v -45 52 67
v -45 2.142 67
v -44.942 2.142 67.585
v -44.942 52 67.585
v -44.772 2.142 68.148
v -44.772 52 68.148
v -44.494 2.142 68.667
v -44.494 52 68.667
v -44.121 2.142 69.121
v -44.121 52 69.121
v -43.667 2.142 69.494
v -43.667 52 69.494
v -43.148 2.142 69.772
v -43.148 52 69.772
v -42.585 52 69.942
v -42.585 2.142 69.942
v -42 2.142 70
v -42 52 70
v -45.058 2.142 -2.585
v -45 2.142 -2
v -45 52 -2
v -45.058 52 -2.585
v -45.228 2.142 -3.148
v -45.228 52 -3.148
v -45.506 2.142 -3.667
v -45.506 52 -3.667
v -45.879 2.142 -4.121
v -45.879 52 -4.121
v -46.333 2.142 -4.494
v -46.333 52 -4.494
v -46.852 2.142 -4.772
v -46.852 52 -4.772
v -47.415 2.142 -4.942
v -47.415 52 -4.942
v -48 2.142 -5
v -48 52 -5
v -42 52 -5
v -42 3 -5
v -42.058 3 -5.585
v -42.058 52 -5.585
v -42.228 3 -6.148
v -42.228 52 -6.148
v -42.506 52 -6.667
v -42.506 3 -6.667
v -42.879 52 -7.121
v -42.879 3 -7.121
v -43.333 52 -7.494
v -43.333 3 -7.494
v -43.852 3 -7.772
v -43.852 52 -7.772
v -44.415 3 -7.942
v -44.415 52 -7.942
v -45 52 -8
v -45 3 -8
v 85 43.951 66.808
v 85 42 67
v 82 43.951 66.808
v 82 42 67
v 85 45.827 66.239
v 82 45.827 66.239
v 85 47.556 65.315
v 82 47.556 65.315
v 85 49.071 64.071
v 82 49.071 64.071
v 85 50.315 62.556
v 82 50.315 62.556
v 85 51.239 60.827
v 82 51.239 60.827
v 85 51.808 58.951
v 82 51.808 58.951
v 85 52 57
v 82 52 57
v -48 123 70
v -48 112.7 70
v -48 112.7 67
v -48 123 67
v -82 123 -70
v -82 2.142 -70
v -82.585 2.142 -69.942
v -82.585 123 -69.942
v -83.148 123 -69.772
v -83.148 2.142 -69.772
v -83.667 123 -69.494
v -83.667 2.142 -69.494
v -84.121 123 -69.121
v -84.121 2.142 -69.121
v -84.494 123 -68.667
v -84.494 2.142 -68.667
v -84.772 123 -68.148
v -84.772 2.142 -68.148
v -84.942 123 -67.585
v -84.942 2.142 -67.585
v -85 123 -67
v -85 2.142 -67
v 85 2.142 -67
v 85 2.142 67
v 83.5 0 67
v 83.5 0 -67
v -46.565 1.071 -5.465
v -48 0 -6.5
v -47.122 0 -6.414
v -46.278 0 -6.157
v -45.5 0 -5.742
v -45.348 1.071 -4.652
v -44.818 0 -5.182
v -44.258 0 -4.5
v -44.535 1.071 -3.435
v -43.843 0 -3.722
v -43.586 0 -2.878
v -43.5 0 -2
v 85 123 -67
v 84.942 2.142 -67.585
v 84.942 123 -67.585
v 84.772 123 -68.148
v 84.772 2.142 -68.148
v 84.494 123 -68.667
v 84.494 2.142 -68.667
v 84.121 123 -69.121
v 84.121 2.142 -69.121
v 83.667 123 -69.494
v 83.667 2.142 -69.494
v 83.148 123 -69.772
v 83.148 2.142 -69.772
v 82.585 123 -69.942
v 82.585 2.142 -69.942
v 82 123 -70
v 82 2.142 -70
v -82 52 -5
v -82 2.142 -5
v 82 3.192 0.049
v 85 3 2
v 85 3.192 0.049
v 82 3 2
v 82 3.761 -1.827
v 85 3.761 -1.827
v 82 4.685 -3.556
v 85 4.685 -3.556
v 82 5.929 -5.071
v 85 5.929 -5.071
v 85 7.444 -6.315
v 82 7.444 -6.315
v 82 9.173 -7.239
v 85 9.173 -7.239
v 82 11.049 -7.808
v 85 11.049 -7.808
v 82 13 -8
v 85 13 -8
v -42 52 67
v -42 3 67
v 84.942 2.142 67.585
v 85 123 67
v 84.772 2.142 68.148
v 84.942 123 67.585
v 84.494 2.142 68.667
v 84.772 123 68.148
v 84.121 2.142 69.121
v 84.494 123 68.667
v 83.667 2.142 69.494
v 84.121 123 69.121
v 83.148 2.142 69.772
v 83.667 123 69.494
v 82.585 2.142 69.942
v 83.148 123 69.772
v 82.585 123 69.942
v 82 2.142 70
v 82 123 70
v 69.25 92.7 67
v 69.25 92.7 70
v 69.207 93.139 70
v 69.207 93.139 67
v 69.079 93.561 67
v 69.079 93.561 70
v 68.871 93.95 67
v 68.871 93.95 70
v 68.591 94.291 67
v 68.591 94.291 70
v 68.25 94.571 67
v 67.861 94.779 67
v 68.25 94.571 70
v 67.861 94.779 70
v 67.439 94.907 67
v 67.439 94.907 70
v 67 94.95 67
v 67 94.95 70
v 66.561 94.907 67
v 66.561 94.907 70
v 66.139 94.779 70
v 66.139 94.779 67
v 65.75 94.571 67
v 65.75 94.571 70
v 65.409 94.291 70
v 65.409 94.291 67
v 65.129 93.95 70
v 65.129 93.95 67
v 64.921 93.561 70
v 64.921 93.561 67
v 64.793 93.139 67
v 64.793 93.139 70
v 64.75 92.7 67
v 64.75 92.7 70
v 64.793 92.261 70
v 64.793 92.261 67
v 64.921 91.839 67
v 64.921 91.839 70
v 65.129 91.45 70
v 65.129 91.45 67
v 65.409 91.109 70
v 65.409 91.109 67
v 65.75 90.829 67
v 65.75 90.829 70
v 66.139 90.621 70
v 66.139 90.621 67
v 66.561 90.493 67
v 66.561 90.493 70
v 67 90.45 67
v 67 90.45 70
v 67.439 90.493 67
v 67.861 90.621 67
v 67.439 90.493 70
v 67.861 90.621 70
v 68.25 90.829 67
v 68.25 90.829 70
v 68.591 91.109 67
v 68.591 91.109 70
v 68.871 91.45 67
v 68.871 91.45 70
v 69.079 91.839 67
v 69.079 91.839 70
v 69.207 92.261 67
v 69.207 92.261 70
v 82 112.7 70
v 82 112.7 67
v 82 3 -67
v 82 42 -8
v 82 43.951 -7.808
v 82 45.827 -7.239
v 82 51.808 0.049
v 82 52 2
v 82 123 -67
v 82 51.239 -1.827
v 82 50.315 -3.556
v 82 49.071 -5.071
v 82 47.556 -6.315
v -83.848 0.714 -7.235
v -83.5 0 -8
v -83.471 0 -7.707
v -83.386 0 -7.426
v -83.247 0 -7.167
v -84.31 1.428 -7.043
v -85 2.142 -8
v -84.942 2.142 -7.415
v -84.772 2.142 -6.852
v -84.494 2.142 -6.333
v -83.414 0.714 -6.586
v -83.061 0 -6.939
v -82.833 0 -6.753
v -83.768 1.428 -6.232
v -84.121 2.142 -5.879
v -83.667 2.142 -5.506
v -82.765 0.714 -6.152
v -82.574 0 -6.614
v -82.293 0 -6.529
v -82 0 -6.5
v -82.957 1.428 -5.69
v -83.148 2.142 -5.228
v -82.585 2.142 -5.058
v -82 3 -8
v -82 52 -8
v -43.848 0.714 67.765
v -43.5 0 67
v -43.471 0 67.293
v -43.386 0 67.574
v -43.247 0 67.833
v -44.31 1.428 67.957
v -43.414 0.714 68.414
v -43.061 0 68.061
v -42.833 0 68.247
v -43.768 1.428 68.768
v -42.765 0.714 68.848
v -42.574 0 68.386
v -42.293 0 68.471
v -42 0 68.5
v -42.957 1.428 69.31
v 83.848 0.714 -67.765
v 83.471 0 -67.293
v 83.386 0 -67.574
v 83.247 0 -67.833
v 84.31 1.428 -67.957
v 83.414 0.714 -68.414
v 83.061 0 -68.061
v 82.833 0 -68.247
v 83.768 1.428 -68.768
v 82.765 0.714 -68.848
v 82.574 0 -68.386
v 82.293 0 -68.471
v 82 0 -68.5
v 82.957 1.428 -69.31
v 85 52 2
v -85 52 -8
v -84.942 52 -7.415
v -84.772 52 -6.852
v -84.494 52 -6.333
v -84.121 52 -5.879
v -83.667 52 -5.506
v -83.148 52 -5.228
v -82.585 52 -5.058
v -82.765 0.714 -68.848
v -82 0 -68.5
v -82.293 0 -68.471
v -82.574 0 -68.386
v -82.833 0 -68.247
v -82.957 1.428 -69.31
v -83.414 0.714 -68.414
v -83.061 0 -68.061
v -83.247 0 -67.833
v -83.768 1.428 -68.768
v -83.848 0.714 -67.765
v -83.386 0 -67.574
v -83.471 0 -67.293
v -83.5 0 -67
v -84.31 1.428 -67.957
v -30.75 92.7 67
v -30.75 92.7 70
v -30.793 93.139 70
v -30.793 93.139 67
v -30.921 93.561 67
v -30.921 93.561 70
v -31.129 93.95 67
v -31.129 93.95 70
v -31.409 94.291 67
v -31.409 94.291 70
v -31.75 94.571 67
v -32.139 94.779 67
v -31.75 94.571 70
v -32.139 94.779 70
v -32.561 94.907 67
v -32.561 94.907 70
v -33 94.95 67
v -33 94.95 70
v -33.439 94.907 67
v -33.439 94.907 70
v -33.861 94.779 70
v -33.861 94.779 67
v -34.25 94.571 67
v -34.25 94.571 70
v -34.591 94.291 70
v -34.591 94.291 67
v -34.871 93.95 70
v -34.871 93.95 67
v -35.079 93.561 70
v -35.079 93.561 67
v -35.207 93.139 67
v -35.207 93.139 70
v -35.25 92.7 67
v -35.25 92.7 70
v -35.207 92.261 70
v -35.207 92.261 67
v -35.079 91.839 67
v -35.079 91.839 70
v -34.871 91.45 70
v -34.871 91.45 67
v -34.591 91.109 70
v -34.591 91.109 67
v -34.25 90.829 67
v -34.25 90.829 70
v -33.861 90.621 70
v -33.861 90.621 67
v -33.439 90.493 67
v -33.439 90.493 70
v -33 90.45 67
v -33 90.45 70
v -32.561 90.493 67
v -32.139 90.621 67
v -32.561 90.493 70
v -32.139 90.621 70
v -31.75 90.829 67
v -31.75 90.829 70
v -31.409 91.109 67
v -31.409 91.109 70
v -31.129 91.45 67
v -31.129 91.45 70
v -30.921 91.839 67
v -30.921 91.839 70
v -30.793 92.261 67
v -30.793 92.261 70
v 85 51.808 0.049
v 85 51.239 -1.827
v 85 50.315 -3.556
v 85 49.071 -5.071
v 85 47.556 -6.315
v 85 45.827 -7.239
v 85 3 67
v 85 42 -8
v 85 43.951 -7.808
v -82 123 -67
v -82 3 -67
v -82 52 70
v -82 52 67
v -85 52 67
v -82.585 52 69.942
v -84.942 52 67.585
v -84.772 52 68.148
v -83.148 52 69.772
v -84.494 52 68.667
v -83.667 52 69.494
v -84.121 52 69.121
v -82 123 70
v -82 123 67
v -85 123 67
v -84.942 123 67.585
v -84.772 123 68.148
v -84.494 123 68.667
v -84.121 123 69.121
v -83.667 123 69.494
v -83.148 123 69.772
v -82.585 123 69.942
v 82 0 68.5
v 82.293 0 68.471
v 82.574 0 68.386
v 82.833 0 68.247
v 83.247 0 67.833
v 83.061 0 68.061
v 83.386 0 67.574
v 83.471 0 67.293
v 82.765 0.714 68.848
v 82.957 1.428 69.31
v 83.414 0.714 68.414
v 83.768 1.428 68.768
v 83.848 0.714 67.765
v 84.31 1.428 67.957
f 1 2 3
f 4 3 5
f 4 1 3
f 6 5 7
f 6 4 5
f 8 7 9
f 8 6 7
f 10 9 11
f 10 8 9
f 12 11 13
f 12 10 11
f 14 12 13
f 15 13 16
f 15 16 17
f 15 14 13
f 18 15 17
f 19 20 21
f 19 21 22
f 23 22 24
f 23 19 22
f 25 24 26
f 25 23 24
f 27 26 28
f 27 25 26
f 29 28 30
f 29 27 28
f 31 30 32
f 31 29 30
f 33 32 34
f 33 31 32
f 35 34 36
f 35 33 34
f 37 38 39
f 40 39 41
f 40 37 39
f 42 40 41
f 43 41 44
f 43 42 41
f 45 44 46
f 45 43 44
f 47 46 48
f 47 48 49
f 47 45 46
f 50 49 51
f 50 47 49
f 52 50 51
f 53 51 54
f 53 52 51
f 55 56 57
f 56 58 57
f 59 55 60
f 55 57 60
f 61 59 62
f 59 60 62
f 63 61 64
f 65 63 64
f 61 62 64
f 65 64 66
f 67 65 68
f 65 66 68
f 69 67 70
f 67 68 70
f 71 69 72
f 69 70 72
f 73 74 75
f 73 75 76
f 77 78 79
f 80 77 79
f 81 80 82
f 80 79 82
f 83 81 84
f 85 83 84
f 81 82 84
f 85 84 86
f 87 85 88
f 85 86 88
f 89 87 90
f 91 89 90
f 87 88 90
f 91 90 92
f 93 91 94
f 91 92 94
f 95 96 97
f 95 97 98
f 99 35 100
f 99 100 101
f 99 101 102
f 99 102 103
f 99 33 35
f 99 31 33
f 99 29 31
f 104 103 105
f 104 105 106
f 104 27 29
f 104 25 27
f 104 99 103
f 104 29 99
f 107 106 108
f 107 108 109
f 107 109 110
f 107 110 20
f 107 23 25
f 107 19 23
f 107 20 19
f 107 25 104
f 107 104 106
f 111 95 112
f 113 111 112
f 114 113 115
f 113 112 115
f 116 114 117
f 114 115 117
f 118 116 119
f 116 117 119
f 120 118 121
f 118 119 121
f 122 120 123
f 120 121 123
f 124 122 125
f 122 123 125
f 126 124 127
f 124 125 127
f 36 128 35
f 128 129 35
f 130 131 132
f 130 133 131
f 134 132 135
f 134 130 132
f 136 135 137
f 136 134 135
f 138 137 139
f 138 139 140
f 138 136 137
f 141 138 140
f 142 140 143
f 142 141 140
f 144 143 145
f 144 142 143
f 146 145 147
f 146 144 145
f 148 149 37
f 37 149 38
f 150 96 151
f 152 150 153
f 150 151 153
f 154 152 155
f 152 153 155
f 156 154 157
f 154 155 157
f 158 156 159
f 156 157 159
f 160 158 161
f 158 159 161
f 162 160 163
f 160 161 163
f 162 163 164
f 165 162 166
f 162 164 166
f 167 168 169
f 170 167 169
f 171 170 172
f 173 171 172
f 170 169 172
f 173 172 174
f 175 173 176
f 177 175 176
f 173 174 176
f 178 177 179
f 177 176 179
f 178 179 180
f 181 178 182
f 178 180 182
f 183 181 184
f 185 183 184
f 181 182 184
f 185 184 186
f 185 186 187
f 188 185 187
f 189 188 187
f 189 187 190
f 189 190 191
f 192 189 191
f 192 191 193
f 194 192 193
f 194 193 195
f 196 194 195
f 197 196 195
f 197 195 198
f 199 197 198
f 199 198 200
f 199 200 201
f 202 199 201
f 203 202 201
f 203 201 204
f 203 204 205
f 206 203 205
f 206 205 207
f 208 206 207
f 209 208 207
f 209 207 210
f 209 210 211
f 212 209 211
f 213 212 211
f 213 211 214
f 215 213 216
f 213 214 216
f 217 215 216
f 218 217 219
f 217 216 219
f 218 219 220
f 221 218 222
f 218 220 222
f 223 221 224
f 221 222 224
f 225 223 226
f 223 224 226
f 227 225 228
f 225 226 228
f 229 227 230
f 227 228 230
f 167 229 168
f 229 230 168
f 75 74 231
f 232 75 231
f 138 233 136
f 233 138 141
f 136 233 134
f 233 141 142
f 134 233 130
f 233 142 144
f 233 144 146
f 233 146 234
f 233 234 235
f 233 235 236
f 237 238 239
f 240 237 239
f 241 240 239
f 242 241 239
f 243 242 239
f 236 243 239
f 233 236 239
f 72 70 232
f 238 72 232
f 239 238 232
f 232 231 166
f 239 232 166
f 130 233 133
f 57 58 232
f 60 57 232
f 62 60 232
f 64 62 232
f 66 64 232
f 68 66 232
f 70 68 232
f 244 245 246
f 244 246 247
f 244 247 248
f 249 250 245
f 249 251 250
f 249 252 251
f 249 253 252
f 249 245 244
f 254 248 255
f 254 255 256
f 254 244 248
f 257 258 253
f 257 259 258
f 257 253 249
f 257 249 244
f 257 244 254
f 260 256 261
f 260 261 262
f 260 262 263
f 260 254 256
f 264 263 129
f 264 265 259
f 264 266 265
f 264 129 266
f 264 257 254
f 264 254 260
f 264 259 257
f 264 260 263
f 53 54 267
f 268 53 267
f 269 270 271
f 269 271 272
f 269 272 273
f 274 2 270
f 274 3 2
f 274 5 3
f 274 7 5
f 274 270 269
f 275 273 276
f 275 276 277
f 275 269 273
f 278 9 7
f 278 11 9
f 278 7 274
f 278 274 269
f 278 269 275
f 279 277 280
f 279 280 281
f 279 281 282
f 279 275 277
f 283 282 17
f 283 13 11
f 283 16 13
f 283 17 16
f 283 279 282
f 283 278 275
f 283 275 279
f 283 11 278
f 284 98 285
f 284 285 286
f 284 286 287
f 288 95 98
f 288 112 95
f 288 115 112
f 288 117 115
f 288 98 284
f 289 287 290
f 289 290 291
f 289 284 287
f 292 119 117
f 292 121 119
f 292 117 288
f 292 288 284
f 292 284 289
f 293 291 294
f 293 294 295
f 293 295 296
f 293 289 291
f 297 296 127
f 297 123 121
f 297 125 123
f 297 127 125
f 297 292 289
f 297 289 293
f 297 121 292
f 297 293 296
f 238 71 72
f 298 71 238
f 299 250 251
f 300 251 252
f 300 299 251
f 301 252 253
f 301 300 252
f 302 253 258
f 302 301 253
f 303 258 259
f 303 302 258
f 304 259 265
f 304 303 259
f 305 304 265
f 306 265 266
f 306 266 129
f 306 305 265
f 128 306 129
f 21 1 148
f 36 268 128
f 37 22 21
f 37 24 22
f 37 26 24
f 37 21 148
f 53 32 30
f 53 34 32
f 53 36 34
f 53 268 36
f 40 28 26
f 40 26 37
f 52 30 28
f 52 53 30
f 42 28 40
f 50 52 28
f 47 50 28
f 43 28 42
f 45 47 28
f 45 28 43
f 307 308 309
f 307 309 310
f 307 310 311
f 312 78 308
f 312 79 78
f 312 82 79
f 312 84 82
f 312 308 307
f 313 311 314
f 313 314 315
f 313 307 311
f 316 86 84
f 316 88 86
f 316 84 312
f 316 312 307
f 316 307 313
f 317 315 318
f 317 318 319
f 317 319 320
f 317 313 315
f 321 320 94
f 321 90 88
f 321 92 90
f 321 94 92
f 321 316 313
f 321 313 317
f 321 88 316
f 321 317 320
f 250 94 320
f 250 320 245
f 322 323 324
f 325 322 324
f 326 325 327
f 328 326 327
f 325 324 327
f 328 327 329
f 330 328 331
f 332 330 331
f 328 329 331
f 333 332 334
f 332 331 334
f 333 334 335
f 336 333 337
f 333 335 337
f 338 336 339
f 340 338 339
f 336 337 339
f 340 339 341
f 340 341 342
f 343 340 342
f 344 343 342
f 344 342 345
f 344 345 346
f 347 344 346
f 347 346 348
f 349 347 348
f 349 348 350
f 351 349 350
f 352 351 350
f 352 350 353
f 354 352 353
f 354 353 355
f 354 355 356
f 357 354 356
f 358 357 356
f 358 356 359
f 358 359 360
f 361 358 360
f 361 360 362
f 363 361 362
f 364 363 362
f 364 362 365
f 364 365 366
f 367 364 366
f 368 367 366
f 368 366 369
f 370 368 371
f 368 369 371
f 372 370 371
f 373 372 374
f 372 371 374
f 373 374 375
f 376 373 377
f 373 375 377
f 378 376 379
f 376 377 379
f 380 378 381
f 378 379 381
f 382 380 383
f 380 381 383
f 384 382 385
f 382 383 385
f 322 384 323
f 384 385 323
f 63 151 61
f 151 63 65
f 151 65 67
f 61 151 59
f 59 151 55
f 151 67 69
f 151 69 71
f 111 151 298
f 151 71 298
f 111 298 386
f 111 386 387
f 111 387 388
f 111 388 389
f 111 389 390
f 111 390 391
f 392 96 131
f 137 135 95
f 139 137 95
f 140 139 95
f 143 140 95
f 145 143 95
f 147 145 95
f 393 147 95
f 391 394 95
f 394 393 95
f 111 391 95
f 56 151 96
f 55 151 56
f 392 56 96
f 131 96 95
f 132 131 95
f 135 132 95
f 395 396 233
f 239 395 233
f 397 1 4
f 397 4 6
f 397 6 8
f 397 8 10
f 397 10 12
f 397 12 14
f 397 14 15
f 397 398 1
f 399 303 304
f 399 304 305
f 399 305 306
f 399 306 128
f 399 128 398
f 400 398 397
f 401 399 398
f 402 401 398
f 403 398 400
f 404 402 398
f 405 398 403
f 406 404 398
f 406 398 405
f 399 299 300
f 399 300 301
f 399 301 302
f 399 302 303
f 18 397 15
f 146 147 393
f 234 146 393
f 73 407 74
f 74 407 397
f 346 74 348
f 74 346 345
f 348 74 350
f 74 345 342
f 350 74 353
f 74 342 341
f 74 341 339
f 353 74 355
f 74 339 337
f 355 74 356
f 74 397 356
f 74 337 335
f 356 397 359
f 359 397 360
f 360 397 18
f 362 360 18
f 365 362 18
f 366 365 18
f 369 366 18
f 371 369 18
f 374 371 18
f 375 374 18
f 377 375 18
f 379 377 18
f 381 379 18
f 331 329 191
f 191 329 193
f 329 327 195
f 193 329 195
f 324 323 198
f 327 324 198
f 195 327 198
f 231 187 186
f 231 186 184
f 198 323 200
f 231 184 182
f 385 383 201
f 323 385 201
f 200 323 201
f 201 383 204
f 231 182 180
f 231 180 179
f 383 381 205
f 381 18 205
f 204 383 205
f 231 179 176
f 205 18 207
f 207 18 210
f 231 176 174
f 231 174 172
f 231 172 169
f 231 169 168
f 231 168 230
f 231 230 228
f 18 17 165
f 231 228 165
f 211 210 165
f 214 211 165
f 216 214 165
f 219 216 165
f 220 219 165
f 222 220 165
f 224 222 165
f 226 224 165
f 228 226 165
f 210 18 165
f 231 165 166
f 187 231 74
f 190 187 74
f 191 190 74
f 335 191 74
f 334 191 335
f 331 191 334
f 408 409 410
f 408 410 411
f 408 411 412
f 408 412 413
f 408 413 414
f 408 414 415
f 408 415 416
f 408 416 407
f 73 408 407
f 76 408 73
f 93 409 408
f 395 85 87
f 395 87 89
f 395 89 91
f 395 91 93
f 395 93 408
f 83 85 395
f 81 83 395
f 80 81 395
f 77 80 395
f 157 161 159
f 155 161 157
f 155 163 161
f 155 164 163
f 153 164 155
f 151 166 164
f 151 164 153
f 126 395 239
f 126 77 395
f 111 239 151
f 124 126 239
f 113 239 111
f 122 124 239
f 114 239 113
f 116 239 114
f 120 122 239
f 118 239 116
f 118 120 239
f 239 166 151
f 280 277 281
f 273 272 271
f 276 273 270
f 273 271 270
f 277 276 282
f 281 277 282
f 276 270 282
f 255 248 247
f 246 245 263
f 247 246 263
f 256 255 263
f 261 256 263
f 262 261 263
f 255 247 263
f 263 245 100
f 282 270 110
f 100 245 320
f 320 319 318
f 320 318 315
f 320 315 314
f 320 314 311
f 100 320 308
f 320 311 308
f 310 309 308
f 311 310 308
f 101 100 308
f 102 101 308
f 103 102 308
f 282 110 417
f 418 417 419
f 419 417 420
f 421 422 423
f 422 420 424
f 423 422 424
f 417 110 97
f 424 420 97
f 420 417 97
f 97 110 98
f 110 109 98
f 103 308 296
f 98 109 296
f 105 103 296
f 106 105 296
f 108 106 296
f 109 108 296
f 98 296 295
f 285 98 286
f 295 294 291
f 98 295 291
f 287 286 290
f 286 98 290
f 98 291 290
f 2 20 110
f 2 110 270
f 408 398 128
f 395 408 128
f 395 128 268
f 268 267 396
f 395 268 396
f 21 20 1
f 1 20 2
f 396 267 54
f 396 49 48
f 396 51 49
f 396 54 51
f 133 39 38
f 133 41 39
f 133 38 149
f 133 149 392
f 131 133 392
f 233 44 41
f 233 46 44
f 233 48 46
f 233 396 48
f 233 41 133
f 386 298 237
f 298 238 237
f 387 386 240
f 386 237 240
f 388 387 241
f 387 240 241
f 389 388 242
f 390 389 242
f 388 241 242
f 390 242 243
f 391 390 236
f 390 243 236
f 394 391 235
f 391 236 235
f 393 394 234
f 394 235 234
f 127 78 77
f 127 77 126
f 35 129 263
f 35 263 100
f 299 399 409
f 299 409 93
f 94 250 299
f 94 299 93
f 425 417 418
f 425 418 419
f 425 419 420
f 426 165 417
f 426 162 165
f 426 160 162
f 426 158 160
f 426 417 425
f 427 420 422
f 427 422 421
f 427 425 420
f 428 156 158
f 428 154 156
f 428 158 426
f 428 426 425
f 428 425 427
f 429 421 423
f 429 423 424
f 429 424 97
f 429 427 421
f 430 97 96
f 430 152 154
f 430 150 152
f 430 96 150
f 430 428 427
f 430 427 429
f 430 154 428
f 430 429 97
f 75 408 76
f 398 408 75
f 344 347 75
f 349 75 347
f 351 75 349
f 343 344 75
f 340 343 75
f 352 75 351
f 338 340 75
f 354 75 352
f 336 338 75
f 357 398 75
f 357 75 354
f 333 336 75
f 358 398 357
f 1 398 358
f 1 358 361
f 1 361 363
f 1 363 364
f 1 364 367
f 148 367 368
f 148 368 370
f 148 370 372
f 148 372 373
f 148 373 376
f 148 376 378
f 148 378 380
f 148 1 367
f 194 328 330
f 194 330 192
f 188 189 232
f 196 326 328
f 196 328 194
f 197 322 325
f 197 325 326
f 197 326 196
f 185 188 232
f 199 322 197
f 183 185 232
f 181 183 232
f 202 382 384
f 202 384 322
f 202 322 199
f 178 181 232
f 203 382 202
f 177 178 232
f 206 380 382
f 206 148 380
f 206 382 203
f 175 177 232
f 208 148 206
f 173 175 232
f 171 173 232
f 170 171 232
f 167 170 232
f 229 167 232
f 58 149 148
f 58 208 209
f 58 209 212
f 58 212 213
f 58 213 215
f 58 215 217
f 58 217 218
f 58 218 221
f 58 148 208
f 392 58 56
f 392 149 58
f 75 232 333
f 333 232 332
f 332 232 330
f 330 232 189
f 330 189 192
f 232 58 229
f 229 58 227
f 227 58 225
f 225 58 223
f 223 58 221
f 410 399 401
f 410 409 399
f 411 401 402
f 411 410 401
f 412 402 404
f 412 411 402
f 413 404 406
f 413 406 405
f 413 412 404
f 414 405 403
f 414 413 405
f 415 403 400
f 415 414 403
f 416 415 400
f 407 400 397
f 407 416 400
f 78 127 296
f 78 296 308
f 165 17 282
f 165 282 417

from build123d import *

# Parameters (mm, degrees)
SKETCH1_W           = 170
SKETCH1_H           = 140
BOSS_EXTRUDE1_DEPTH = 3
SKETCH3_W           = 170
SKETCH3_H           = 140
SKETCH3_W_2         = 164
SKETCH3_H_2         = 134
BOSS_EXTRUDE2_DEPTH = 120
CUT_EXTRUDE1_REACH  = 206.827
SKETCH4_W           = 130
SKETCH4_H           = 10.3
SKETCH5_W           = 75
SKETCH5_H           = 52
CUT_EXTRUDE2_DEPTH  = 40
BOSS_EXTRUDE3_DEPTH = 49
CUT_EXTRUDE3_REACH  = 206.827
SKETCH8_R           = 2.25
CUT_EXTRUDE4_REACH  = 223.199
SKETCH9_W           = 75
SKETCH9_H           = 49
FILLET1_R           = 3
CHAMFER1_SIZE       = 1.5
CHAMFER1_SIZE2      = 2.14222201
FILLET2_R           = 10


with BuildPart() as part:
    # Sketch1 → Boss-Extrude1 (new body)
    with BuildSketch(Plane(origin=(0, 0, 0), x_dir=(1, 0, 0), z_dir=(0, 1, 0))):
        Rectangle(SKETCH1_W, SKETCH1_H)
    extrude(amount=BOSS_EXTRUDE1_DEPTH)

    # Sketch3 → Boss-Extrude2 (add)
    with BuildSketch(Plane(origin=(0, 3, 0), x_dir=(1, 0, 0), z_dir=(0, 1, 0))):
        Rectangle(SKETCH3_W, SKETCH3_H)
        Rectangle(SKETCH3_W_2, SKETCH3_H_2, mode=Mode.SUBTRACT)
    extrude(amount=BOSS_EXTRUDE2_DEPTH)

    # Sketch4 → Cut-Extrude1 (cut, up to next)
    with BuildSketch(Plane.XY.offset(70), mode=Mode.PRIVATE) as cut_extrude1_sk1:
        with Locations((17, 117.85)):
            Rectangle(SKETCH4_W, SKETCH4_H)
    cut_extrude1_tool1 = extrude(cut_extrude1_sk1.sketch, amount=-CUT_EXTRUDE1_REACH, mode=Mode.PRIVATE) & part.part
    add(cut_extrude1_tool1.solids().sort_by_distance((17, 117.85, 70))[0], mode=Mode.SUBTRACT)

    # Sketch5 → Cut-Extrude2 (cut)
    with BuildSketch(Plane.ZY.offset(85)):
        with Locations((32.5, 26)):
            Rectangle(SKETCH5_W, SKETCH5_H)
    extrude(amount=-CUT_EXTRUDE2_DEPTH, mode=Mode.SUBTRACT)

    # Sketch6 → Boss-Extrude3 (add)
    with BuildSketch(Plane(origin=(0, 3, 0), x_dir=(1, 0, 0), z_dir=(0, 1, 0))):
        Polygon((-45, 5), (-45, -67), (-42, -67), (-42, 8), (-82, 8), (-82, 5), align=None)
    extrude(amount=BOSS_EXTRUDE3_DEPTH)

    # Sketch8 → Cut-Extrude3 (cut, up to next)
    with BuildSketch(Plane.XY.offset(70), mode=Mode.PRIVATE) as cut_extrude3_sk1:
        with Locations((67, 92.7)):
            Circle(SKETCH8_R)
    cut_extrude3_tool1 = extrude(cut_extrude3_sk1.sketch, amount=-CUT_EXTRUDE3_REACH, mode=Mode.PRIVATE) & part.part
    # Sketch8 → Cut-Extrude3 (cut, up to next)
    with BuildSketch(Plane.XY.offset(70), mode=Mode.PRIVATE) as cut_extrude3_sk2:
        with Locations((-33, 92.7)):
            Circle(SKETCH8_R)
    cut_extrude3_tool2 = extrude(cut_extrude3_sk2.sketch, amount=-CUT_EXTRUDE3_REACH, mode=Mode.PRIVATE) & part.part
    add(cut_extrude3_tool1.solids().sort_by_distance((67, 92.7, 70))[0], mode=Mode.SUBTRACT)
    add(cut_extrude3_tool2.solids().sort_by_distance((-33, 92.7, 70))[0], mode=Mode.SUBTRACT)

    # Sketch9 → Cut-Extrude4 (cut, up to next)
    with BuildSketch(Plane(origin=(85, 0, 0), x_dir=(0, 0, -1), z_dir=(1, 0, 0)), mode=Mode.PRIVATE) as cut_extrude4_sk1:
        with Locations((-29.5, 27.5)):
            Rectangle(SKETCH9_W, SKETCH9_H)
    cut_extrude4_tool1 = extrude(cut_extrude4_sk1.sketch, amount=-CUT_EXTRUDE4_REACH, mode=Mode.PRIVATE) & part.part
    add(cut_extrude4_tool1.solids().sort_by_distance((85, 27.5, 29.5))[0], mode=Mode.SUBTRACT)

    # Fillet1
    fillet1_edges = [part.edges().sort_by_distance(p)[0] for p in [
        (-45, 26, -5),
        (-45, 26, 70),
        (-85, 26, -5),
        (-42, 27.5, -8),
        (85, 61.5, 70),
        (-85, 87.5, 70),
        (-85, 61.5, -70),
        (85, 61.5, -70),
    ]]
    fillet(fillet1_edges, radius=FILLET1_R - 0.0001)  # a hair under: the kernel refuses the full size

    # Chamfer1
    chamfer1_edges = [part.edges().sort_by_distance(p)[0] for p in [
        (-45, 0, 32.5),
        (20, 0, 70),
        (-65, 0, -5),
        (-85, 0, -37.5),
        (0, 0, -70),
        (85, 0, 0),
        (-84.121349633, 0, -69.121349633),
        (84.121349633, 0, 69.121349633),
        (84.121349633, 0, -69.121349633),
        (-84.121349633, 0, -5.878650367),
        (-44.121349633, 0, 69.121349633),
        (-45.878650367, 0, -4.121349633),
    ]]
    chamfer1_side = [part.faces().sort_by_distance(p)[0] for p in [
        (9.378358702, 0, -4.68911711),
    ]]
    chamfer(chamfer1_edges, length=CHAMFER1_SIZE, length2=CHAMFER1_SIZE2, reference=chamfer1_side[0])

    # Fillet2
    fillet2_edges = [part.edges().sort_by_distance(p)[0] for p in [
        (83.5, 52, 67),
        (83.5, 52, -8),
        (83.5, 3, -8),
    ]]
    fillet(fillet2_edges, radius=FILLET2_R)


solid = part.part
